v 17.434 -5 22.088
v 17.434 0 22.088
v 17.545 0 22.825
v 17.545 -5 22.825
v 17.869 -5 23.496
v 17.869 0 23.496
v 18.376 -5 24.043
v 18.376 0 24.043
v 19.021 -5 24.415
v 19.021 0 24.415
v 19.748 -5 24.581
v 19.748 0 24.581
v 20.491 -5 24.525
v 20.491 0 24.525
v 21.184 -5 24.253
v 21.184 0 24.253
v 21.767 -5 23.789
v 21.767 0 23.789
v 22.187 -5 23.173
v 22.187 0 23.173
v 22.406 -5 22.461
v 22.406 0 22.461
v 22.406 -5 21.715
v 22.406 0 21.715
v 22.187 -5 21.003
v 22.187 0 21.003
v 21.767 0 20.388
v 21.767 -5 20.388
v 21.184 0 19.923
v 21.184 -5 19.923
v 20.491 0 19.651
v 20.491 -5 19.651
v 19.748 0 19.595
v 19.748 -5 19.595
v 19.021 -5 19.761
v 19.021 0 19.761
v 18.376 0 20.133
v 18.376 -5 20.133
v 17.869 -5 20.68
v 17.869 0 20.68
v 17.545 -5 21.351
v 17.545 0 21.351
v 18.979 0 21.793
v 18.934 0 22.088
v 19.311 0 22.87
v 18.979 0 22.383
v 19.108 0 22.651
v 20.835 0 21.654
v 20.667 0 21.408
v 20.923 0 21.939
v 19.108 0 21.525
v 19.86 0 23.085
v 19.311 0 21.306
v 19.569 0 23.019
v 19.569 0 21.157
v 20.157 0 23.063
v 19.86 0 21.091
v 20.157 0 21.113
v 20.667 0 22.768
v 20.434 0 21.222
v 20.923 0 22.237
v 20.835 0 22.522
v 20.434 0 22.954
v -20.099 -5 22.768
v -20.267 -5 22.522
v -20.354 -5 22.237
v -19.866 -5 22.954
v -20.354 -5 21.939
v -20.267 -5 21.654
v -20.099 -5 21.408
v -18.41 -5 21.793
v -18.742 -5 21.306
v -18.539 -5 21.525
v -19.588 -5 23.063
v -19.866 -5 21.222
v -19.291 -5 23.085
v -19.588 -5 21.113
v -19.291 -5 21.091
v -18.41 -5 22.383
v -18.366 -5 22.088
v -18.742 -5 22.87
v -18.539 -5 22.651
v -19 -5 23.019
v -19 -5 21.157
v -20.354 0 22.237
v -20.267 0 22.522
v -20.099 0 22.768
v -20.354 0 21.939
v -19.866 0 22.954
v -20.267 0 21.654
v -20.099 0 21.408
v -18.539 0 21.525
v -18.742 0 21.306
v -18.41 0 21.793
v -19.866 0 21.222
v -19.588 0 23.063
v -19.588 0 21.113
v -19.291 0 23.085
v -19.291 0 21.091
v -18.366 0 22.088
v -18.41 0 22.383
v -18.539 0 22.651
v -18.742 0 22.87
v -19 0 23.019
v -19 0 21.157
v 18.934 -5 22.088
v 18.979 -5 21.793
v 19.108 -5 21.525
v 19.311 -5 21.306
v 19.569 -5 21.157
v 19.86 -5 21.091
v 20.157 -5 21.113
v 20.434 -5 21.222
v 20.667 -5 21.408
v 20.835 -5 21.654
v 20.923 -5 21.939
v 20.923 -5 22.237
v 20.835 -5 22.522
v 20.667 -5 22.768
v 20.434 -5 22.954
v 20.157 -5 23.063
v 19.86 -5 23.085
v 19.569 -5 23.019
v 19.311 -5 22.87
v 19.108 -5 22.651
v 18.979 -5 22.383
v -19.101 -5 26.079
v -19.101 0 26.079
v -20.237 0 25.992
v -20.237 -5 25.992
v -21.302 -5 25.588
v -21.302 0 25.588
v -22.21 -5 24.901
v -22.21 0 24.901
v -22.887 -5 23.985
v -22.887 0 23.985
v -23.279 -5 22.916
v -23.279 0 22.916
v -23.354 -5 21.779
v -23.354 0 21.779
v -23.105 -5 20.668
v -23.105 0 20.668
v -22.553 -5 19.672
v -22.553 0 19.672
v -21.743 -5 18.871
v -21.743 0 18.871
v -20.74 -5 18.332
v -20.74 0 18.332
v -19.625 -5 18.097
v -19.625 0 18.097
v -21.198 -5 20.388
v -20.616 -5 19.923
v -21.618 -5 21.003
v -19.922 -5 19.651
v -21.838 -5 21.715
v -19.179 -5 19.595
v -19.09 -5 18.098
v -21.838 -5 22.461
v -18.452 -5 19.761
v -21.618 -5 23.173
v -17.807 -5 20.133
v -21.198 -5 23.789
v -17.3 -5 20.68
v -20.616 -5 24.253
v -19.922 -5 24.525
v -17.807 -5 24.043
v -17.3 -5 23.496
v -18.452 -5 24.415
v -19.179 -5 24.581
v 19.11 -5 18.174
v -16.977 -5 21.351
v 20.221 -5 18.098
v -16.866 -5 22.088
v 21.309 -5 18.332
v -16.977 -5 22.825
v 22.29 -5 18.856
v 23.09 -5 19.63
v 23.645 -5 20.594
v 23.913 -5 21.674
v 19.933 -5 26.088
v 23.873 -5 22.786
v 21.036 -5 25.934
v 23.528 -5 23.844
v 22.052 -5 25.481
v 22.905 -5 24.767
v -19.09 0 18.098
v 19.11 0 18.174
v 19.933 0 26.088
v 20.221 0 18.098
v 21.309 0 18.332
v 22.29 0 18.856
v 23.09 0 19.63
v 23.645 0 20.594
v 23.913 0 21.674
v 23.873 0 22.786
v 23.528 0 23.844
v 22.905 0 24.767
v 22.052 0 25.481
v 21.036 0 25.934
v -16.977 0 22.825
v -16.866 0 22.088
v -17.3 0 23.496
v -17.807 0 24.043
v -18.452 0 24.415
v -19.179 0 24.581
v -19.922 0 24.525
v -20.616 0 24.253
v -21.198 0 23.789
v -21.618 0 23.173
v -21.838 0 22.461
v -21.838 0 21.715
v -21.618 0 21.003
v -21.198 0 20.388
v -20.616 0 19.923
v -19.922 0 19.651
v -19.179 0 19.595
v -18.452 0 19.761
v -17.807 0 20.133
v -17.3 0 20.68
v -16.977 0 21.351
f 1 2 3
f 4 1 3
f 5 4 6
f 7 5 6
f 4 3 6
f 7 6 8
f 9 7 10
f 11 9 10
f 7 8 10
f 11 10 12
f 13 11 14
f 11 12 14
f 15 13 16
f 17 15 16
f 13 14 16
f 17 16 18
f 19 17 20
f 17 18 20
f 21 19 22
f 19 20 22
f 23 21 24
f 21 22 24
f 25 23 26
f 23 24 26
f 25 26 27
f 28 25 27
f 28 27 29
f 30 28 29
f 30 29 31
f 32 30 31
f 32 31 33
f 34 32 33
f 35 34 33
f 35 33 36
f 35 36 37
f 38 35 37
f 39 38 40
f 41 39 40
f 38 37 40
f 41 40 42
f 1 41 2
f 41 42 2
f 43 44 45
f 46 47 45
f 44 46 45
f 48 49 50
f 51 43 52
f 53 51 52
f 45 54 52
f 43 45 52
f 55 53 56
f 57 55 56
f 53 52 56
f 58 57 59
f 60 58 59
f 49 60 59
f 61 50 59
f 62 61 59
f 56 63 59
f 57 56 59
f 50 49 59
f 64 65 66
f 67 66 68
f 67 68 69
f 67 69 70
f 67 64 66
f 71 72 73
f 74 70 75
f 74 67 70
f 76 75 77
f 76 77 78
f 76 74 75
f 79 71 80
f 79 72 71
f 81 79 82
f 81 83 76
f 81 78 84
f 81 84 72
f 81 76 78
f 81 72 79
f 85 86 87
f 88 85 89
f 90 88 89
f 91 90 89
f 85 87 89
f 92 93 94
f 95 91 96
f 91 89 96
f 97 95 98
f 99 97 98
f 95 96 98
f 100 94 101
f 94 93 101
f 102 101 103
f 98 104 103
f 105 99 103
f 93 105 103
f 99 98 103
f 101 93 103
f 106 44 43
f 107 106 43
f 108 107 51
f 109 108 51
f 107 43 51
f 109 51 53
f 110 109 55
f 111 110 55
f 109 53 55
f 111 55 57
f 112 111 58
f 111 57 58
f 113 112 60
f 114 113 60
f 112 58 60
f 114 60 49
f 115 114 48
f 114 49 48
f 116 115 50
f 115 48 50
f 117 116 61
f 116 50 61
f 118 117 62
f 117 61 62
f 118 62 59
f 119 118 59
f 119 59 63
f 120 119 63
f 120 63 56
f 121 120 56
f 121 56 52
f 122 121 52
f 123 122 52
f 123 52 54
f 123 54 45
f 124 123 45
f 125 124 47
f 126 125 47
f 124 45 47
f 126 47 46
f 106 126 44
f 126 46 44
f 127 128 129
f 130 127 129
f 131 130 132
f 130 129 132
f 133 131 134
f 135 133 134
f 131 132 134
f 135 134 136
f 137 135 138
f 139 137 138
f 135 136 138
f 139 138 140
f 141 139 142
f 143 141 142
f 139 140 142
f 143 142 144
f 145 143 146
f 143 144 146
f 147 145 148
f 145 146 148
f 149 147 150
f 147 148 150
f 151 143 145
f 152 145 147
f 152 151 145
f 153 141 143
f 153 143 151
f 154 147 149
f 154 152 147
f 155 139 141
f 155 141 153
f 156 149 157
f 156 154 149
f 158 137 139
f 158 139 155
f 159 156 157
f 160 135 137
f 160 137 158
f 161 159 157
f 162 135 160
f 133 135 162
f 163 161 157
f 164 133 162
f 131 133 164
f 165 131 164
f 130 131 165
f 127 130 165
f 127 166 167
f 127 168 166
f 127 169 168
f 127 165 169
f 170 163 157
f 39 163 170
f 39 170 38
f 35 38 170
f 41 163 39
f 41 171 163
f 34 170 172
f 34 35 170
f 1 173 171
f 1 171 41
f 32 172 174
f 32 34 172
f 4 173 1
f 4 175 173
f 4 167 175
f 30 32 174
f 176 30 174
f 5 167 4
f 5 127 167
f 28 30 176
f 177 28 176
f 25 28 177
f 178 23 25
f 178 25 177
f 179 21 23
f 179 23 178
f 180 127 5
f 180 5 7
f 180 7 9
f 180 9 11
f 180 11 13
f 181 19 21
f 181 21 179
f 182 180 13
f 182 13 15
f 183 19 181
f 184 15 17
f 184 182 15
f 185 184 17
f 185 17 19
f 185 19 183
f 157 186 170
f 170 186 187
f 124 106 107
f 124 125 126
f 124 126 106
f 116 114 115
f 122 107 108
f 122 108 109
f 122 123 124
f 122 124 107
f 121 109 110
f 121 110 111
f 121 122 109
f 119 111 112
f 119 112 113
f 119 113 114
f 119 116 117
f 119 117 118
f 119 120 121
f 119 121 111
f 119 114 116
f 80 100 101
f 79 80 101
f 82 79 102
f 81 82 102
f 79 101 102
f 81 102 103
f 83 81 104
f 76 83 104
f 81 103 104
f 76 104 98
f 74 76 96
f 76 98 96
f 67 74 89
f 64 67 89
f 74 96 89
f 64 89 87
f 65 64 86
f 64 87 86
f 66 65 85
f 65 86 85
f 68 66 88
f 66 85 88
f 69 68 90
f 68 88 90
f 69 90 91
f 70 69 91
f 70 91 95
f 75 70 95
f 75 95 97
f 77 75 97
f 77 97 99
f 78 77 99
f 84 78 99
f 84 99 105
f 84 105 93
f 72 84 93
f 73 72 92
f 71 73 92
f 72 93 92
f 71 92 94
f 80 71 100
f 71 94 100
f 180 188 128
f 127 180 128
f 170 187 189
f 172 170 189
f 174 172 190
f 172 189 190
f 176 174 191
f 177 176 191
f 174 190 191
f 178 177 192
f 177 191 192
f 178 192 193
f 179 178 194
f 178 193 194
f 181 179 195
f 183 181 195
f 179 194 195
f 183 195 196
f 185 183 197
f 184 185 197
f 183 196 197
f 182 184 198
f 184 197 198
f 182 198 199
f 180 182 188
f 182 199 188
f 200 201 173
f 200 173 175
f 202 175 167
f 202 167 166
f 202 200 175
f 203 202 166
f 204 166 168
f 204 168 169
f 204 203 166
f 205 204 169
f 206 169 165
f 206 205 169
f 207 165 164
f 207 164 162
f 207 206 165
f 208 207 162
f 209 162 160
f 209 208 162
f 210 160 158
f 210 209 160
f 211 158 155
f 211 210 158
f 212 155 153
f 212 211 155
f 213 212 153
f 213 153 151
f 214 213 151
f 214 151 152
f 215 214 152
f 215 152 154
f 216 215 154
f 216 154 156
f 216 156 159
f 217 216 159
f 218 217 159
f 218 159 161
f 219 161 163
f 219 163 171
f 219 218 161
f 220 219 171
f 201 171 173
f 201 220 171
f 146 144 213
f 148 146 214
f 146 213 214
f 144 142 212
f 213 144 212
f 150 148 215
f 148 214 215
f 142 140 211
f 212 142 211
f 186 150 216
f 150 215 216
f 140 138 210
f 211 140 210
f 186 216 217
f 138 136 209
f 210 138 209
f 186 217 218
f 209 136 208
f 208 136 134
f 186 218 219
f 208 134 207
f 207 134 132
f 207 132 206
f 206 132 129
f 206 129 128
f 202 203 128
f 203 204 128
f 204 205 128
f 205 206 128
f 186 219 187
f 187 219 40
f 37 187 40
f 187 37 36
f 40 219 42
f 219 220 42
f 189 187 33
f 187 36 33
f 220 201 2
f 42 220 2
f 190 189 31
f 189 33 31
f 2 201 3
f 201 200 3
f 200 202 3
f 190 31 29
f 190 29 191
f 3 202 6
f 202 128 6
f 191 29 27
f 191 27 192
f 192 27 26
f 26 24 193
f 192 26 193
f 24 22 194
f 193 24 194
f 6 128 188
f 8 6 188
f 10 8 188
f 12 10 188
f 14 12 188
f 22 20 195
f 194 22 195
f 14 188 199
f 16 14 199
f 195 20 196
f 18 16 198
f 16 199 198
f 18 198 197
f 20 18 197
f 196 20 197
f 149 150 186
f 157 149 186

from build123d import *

# Parameters (mm, degrees)
F0_R     = 2.5
F1_DEPTH = 5
F0_R_2   = 1
F2_DEPTH = 5


with BuildPart() as f1:
    # F0 (on Front) → F1 (new body)
    with BuildSketch(Plane.XZ):
        with BuildLine():
            Line((19.933497, 26.088069), (-19.100958, 26.079305))
            ThreePointArc((-19.100958, 26.079305), (-23.357003, 22.35026), (-19.625339, 18.096511))
            Line((-19.625339, 18.096511), (-19.089927, 18.097581))
            Line((-19.089927, 18.097581), (19.110306, 18.17388))
            ThreePointArc((19.110306, 18.17388), (23.912931, 21.674244), (19.933497, 26.088069))
        make_face()
        with Locations((-19.365605, 22.088069)):
            Circle(F0_R, mode=Mode.SUBTRACT)
        with BuildLine():
            ThreePointArc((22.434395, 22.088069), (19.934395, 19.588069), (17.434395, 22.088069))
            ThreePointArc((17.434395, 22.088069), (19.934395, 24.588069), (22.434395, 22.088069))
        make_face(mode=Mode.SUBTRACT)
    extrude(amount=F1_DEPTH)


with BuildPart() as f2:
    # F0 (on Front) → F2 (new body)
    with BuildSketch(Plane.XZ):
        with Locations((-19.365605, 22.088069)):
            Circle(F0_R_2)
        with BuildLine():
            ThreePointArc((20.934395, 22.088069), (19.934395, 23.088069), (18.934395, 22.088069))
            ThreePointArc((18.934395, 22.088069), (19.934395, 21.088069), (20.934395, 22.088069))
        make_face()
    extrude(amount=F2_DEPTH)


solid = Compound([f1.part, f2.part])
